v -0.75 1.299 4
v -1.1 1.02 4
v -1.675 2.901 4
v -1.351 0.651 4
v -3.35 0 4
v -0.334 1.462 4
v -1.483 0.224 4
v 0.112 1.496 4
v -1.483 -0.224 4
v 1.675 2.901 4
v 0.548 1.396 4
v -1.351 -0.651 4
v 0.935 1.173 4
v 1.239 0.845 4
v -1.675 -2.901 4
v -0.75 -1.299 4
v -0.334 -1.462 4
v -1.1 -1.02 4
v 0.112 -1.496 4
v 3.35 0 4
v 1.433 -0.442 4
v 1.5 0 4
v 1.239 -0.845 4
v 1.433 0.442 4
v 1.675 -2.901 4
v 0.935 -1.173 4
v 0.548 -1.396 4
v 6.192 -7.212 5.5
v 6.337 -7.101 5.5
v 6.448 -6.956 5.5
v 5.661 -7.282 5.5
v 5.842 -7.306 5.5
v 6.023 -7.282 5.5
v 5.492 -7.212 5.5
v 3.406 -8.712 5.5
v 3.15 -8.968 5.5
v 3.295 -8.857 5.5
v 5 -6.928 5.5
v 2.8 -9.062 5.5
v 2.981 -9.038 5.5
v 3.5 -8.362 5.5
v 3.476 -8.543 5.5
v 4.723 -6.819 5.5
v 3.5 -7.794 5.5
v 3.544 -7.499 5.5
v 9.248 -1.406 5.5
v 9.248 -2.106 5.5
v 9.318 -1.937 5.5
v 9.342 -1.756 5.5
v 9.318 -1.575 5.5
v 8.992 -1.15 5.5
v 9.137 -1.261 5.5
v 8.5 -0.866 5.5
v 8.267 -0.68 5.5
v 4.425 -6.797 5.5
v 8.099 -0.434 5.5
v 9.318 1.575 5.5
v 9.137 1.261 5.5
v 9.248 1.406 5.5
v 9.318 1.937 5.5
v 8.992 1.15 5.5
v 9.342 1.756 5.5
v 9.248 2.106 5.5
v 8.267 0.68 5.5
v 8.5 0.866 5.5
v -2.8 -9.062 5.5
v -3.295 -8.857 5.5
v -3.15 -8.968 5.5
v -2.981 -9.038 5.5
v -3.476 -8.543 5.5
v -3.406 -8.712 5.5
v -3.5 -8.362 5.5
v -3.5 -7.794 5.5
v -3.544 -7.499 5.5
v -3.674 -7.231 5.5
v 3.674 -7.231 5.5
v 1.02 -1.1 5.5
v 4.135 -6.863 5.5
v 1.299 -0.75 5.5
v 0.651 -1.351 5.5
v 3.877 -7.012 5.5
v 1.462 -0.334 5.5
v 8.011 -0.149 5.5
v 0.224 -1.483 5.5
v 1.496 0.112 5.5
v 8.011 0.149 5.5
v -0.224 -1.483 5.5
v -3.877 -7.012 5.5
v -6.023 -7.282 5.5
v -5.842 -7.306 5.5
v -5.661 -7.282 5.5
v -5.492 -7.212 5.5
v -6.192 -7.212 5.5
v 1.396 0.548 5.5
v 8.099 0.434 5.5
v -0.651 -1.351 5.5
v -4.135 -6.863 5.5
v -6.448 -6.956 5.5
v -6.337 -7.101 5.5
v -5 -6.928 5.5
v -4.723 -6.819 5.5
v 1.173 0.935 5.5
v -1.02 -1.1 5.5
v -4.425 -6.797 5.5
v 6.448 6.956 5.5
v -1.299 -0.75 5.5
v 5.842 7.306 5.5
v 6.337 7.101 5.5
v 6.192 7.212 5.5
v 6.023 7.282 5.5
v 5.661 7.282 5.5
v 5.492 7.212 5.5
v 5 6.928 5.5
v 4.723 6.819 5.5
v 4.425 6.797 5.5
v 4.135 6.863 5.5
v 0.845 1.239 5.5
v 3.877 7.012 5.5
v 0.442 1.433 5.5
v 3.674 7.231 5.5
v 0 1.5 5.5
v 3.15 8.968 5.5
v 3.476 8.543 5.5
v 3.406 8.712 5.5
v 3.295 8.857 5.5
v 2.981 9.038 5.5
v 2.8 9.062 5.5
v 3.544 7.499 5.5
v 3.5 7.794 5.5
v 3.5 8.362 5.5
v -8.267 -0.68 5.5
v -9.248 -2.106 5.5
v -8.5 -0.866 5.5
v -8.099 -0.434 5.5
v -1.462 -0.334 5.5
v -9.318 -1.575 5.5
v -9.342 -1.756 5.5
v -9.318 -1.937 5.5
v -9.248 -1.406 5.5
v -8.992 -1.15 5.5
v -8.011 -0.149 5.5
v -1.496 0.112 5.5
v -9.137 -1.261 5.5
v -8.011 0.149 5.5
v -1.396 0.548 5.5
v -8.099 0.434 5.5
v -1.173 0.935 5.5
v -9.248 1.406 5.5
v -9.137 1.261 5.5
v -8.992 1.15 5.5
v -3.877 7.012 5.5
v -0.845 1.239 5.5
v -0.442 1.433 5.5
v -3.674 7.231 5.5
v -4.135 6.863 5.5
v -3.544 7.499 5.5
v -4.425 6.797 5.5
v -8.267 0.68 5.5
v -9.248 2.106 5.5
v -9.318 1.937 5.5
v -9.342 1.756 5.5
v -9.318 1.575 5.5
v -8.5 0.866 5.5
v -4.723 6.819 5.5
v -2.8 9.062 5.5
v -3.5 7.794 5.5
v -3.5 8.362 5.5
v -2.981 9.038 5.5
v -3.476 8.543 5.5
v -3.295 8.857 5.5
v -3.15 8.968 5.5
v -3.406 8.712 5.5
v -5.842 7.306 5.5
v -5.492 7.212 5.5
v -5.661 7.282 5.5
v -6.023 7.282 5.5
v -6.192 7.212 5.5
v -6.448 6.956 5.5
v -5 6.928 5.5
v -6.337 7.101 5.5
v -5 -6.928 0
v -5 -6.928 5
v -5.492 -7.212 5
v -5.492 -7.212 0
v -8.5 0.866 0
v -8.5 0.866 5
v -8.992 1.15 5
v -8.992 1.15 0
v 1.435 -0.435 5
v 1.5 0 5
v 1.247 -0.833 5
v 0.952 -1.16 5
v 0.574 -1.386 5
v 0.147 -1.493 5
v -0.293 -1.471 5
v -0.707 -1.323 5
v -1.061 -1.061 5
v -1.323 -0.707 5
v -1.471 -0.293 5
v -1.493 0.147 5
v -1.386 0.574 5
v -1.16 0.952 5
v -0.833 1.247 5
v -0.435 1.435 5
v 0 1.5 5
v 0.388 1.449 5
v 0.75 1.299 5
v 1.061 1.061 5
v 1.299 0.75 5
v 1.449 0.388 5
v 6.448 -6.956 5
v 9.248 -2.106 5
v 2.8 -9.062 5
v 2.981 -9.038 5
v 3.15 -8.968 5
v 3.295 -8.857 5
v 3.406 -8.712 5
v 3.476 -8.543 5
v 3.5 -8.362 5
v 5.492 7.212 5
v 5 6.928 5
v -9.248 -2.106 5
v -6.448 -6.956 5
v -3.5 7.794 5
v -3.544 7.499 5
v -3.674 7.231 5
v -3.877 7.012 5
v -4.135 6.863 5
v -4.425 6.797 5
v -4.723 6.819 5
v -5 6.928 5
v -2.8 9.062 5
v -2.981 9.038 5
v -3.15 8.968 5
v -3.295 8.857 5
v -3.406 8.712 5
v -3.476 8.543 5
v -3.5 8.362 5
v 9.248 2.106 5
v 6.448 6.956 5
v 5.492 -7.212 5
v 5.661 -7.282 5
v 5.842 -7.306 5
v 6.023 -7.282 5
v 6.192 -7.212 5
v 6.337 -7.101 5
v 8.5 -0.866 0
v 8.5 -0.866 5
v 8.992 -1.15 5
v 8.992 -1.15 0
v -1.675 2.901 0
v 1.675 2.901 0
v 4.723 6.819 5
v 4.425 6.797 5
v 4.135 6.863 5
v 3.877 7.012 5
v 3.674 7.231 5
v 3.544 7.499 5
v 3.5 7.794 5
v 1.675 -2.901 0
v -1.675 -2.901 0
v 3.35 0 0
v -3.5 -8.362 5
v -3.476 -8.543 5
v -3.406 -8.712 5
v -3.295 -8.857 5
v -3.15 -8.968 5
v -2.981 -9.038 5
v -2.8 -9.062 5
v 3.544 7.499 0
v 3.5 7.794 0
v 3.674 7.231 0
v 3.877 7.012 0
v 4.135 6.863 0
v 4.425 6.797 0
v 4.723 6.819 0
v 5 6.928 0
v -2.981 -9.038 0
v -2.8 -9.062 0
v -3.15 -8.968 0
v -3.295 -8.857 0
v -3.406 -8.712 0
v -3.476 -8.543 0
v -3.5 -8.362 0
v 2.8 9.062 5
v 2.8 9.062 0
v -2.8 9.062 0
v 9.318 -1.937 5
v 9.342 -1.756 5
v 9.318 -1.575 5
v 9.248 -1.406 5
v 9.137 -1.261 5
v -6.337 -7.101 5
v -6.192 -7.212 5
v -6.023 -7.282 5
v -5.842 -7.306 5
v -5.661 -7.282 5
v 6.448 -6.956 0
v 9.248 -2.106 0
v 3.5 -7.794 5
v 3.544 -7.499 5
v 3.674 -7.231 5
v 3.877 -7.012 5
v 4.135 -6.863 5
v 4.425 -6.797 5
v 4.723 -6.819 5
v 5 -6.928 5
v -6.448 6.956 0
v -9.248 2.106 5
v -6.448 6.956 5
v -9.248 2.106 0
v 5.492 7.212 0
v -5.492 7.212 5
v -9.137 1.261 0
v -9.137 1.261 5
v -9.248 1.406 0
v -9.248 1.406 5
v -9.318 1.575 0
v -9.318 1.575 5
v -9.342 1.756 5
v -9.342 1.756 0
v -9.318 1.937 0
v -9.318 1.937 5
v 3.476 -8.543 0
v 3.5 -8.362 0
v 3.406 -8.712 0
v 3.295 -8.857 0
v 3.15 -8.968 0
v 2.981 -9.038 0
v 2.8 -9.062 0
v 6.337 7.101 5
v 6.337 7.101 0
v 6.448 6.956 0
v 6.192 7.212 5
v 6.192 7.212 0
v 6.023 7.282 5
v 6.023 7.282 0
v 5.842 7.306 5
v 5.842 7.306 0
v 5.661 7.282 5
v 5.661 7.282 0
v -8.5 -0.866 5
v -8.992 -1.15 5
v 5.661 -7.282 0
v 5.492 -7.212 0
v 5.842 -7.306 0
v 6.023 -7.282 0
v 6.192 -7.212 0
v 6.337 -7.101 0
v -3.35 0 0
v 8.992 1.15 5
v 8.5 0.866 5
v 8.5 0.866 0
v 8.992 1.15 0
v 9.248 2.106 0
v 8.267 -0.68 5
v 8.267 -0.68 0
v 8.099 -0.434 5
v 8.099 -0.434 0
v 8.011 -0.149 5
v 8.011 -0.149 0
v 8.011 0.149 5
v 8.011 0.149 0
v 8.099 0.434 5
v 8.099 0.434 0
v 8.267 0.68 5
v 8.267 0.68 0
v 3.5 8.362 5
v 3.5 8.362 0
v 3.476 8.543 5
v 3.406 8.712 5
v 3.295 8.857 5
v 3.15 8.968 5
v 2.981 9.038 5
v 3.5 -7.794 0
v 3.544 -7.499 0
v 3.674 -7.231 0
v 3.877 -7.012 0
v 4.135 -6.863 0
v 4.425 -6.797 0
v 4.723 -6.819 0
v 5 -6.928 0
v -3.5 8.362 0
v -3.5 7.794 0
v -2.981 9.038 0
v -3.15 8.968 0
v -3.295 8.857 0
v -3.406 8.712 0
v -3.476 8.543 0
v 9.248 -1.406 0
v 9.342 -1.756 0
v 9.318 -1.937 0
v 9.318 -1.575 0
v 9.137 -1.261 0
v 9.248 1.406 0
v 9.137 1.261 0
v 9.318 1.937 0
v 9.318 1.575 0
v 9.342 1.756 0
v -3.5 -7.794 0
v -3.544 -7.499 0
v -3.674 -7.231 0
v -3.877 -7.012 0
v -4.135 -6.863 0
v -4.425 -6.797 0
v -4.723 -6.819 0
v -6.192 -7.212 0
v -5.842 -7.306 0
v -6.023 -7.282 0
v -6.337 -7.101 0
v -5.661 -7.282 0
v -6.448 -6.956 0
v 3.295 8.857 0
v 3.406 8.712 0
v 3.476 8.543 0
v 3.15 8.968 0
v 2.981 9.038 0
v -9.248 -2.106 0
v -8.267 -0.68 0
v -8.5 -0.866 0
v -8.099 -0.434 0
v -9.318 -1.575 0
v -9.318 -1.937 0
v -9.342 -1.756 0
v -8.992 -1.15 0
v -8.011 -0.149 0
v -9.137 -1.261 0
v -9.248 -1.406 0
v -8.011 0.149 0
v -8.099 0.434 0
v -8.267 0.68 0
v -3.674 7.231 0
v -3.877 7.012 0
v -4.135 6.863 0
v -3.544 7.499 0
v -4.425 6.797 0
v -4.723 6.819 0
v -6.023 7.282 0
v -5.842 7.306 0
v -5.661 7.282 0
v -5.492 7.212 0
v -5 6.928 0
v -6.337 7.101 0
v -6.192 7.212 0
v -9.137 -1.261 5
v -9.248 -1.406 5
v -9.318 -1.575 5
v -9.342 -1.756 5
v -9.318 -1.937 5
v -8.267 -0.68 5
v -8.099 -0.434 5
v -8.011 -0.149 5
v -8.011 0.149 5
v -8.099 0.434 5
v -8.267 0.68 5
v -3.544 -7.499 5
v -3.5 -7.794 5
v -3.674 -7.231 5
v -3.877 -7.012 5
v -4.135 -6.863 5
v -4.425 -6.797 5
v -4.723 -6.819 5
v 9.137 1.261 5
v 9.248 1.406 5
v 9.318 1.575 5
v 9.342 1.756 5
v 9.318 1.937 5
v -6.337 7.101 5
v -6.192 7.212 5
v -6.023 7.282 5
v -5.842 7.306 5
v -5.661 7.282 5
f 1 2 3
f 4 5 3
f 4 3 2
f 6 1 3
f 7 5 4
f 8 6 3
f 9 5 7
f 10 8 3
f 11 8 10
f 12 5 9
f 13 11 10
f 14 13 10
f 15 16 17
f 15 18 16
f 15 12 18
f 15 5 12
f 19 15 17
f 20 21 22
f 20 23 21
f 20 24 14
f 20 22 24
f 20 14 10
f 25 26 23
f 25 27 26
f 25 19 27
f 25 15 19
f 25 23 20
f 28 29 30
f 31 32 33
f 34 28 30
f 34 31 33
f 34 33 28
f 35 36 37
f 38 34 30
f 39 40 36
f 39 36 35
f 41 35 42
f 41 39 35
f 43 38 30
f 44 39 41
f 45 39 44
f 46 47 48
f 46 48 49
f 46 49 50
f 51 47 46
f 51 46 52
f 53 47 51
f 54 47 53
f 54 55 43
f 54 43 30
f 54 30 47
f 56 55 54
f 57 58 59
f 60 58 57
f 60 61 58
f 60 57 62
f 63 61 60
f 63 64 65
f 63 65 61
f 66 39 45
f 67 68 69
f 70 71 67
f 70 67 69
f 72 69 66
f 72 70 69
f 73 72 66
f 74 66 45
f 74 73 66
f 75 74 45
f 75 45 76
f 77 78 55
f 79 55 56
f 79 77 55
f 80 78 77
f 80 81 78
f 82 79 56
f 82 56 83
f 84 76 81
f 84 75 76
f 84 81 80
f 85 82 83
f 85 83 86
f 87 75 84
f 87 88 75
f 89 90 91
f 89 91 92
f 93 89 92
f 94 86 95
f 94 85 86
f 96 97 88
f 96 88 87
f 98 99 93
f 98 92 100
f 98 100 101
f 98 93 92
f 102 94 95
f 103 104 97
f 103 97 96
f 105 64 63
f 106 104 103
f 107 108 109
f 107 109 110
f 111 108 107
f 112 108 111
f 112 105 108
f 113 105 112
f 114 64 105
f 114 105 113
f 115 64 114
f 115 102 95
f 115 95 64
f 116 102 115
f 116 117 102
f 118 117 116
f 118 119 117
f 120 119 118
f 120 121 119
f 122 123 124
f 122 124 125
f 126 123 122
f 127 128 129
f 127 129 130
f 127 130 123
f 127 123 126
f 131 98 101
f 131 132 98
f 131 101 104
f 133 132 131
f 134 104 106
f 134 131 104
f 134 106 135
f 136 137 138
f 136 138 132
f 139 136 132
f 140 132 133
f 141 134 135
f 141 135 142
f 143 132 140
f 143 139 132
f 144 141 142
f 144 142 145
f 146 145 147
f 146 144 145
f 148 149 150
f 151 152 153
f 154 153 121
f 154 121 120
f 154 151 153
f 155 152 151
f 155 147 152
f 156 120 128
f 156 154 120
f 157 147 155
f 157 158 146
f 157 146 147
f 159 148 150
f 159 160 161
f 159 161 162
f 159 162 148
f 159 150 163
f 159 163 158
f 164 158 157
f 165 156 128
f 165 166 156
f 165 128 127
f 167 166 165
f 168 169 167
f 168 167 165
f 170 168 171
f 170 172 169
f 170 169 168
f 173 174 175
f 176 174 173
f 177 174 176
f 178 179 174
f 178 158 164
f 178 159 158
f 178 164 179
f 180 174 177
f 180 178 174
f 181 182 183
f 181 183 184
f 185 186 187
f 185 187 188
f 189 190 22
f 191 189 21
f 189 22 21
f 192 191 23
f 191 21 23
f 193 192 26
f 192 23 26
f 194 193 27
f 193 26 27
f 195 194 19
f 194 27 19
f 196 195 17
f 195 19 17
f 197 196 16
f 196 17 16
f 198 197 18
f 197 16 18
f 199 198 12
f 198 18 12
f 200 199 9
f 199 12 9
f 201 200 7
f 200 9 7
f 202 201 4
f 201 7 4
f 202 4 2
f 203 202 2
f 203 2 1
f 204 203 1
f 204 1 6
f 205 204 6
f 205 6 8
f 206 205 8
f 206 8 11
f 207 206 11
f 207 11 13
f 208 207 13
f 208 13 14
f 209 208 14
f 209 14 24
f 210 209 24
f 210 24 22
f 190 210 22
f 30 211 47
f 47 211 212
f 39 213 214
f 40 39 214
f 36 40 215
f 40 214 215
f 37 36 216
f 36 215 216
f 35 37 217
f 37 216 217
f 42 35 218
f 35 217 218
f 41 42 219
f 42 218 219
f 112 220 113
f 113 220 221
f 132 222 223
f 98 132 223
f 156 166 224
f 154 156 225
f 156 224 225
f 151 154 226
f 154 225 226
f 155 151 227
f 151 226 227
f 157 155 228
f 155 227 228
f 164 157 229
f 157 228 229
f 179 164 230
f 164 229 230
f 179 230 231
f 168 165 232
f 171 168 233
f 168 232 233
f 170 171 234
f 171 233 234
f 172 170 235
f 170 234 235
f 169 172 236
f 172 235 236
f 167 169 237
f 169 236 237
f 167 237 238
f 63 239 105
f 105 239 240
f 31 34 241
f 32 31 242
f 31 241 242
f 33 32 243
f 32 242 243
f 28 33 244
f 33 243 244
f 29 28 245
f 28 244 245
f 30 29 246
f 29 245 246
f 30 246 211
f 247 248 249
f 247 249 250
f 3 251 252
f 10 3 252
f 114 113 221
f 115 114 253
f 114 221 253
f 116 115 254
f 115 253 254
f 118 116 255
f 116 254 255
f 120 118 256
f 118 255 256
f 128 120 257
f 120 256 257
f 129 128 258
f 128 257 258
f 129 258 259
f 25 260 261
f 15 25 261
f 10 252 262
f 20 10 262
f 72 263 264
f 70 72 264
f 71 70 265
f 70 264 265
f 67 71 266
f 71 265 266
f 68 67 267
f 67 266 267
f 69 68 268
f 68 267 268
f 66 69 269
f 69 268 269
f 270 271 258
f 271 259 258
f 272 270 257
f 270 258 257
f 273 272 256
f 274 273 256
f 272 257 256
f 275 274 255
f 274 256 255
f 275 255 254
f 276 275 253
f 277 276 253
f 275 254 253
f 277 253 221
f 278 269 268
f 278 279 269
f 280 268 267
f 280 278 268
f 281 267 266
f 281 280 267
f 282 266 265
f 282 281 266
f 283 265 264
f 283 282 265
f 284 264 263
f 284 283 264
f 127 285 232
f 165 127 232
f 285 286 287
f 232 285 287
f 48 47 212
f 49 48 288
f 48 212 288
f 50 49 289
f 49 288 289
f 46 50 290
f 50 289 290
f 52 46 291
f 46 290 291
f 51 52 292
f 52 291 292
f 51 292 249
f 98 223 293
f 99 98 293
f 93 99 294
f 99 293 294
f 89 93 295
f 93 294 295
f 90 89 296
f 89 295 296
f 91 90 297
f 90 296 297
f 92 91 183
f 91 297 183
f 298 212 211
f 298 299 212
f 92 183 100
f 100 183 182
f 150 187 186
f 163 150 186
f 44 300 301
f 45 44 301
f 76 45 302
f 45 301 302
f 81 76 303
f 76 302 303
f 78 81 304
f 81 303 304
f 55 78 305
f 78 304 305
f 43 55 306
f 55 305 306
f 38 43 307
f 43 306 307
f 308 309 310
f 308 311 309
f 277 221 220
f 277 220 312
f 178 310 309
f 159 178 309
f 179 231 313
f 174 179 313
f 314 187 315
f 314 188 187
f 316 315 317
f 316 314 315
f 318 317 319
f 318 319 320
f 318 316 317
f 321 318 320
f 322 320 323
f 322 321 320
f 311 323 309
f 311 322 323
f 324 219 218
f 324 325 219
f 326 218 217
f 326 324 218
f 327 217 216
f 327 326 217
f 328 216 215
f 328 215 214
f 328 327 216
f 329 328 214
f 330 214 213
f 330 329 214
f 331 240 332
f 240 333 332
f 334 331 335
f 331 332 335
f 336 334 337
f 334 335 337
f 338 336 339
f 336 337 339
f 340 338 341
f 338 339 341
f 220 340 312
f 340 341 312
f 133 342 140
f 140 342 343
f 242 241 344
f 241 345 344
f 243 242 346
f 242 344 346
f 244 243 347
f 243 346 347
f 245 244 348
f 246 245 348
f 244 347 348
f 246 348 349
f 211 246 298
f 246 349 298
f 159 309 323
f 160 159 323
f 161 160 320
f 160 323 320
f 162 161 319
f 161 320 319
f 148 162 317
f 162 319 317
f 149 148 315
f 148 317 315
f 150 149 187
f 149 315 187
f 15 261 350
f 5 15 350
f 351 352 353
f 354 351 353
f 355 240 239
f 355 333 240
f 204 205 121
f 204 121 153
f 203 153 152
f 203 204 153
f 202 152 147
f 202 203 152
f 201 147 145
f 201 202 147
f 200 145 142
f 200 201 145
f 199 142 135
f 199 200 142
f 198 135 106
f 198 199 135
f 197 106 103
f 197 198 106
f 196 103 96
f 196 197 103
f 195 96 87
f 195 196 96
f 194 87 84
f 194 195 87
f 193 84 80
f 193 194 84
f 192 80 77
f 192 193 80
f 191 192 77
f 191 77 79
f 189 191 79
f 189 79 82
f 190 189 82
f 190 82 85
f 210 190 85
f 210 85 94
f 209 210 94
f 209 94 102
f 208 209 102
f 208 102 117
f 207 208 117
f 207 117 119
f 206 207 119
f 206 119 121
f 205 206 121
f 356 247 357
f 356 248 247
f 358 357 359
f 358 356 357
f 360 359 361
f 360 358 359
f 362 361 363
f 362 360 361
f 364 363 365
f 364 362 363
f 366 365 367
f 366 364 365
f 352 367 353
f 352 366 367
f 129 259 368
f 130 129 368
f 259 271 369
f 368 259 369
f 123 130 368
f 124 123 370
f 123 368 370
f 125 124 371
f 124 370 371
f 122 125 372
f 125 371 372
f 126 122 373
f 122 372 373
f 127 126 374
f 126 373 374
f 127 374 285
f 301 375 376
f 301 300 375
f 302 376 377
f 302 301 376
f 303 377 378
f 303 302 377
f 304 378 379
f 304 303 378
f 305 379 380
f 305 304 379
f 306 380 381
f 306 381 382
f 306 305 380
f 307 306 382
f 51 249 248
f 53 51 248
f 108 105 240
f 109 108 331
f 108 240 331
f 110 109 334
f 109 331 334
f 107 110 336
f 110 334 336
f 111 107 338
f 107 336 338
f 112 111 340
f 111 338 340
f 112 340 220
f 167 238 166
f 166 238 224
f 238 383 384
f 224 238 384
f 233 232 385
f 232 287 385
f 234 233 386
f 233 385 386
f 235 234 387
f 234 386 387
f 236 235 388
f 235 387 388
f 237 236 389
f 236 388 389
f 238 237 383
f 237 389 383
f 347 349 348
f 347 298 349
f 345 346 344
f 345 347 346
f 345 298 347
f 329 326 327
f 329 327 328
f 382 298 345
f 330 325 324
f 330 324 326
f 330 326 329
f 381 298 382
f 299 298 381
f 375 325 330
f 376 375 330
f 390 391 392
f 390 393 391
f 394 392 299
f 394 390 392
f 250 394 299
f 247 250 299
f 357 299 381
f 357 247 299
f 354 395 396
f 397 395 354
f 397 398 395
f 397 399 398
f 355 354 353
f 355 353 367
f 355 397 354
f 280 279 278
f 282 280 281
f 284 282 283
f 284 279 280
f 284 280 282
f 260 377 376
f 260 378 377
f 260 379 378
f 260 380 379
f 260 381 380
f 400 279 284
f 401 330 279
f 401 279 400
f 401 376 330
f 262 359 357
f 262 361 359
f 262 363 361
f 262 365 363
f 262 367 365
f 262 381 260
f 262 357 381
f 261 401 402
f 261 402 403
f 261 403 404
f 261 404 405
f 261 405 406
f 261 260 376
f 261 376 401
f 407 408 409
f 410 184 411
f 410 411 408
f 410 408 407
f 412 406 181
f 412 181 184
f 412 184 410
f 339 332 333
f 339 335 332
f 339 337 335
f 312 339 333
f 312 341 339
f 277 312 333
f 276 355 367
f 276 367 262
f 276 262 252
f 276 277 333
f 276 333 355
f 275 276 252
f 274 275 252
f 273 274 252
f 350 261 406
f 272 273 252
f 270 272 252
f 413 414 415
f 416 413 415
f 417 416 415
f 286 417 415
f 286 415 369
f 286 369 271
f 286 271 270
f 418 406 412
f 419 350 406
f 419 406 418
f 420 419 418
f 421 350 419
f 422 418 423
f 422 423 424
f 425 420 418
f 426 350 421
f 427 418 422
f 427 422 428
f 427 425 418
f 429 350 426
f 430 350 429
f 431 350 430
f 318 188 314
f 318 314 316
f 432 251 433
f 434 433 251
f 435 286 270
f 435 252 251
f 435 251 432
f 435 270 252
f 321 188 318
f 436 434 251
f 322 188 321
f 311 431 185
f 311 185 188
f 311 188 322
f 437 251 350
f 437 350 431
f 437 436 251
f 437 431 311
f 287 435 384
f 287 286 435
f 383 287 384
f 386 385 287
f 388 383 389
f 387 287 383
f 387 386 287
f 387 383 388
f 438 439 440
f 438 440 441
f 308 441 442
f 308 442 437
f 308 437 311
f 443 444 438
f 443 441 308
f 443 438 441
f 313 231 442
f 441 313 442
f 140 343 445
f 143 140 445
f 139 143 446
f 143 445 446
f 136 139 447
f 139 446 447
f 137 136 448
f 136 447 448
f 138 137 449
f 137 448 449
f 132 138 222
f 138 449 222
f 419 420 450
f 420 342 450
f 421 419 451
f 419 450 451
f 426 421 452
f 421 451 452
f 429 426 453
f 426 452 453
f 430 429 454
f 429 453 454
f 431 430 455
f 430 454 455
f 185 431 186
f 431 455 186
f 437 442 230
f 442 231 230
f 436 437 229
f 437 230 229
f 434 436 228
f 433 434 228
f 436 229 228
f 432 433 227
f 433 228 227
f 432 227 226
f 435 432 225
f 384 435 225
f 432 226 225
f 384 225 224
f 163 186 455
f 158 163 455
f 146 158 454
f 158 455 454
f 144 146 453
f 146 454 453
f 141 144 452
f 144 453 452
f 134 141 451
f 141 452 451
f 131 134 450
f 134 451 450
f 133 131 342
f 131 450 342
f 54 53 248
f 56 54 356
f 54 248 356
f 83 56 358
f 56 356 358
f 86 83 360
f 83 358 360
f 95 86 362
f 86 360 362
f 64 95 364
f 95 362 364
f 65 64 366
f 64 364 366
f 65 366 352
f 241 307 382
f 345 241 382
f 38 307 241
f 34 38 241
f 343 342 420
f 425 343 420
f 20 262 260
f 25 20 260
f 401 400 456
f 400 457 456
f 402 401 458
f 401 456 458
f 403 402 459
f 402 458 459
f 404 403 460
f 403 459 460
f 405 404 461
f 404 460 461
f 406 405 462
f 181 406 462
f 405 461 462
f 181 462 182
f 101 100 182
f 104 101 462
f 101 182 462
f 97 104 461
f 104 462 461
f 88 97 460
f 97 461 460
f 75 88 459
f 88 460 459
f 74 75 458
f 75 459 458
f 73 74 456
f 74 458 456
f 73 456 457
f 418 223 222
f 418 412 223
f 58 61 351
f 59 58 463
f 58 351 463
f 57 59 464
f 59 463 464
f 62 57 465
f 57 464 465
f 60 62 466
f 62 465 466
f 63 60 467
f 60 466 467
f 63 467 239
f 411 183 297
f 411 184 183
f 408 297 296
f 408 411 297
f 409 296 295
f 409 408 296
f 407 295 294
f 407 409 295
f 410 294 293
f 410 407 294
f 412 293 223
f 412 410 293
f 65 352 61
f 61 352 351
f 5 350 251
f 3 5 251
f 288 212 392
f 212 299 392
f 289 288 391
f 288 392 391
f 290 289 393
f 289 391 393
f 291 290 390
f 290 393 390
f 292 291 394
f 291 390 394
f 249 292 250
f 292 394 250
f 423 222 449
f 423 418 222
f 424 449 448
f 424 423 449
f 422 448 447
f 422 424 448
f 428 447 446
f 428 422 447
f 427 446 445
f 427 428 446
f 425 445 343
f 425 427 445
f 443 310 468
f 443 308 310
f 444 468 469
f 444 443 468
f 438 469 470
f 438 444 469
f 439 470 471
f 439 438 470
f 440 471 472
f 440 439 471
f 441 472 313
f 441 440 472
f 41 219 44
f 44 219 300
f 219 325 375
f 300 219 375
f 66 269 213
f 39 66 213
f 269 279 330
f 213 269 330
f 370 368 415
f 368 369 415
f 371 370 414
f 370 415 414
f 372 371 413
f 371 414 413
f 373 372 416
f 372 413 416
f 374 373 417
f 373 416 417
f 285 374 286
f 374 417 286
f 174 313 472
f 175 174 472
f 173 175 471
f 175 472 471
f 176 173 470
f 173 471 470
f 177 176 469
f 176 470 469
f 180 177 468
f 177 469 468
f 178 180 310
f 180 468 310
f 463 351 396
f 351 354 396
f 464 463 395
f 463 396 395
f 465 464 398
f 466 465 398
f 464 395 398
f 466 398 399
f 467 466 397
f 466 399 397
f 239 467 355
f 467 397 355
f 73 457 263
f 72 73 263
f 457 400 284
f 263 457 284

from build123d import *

# Parameters (mm, degrees)
PAD_DEPTH         = 5
POCKET_DEPTH      = 4
POCKET_FACE1_W    = 7
POCKET_FACE1_H    = 5
PAD001_DEPTH      = 3
PAD001_FACE6_W    = 7
PAD001_FACE6_H    = 5
PAD002_DEPTH      = 3
PAD002_FACE6_W    = 7
PAD002_FACE6_H    = 5
PAD003_DEPTH      = 3
PAD003_FACE1_W    = 7
PAD003_FACE1_H    = 5
PAD004_DEPTH      = 3
PAD004_FACE1_W    = 7
PAD004_FACE1_H    = 5
PAD005_DEPTH      = 3
PAD005_FACE1_W    = 7
PAD005_FACE1_H    = 5
PAD006_DEPTH      = 3
FILLET_R          = 1
FILLET001_R       = 0.7
SKETCH002_R       = 1.5
POCKET001_DEPTH   = 5
POCKET001_FACE5_R = 1.5
PAD007_DEPTH      = 0.5


with BuildPart() as part:
    # Sketch → Pad (new body)
    with BuildSketch(Plane.XY):
        Polygon((7, 0), (3.5, 6.0621778265), (-3.5, 6.0621778265), (-7, 0), (-3.5, -6.0621778265), (3.5, -6.0621778265), align=None)
    extrude(amount=PAD_DEPTH)

    # Sketch001 (on Face7 of Pad) → Pocket (cut)
    with BuildSketch(Plane(origin=(0, 0, 0), x_dir=(1, 0, 0), z_dir=(0, 0, -1))):
        Polygon((3.35, 0), (1.675, 2.9011851027), (-1.675, 2.9011851027), (-3.35, 0), (-1.675, -2.9011851027), (1.675, -2.9011851027), align=None)
    extrude(amount=-POCKET_DEPTH, mode=Mode.SUBTRACT)

    # Pocket Face1 → Pad001 (add)
    with BuildSketch(Plane(origin=(5.25, 3.0310889132, 2.5), x_dir=(0.5, -0.8660254038, 0), z_dir=(0.8660254038, 0.5, 0))):
        Rectangle(POCKET_FACE1_W, POCKET_FACE1_H)
    extrude(amount=PAD001_DEPTH)

    # Pad001 Face6 → Pad002 (add)
    with BuildSketch(Plane(origin=(-5.25, -3.0310889132, 2.5), x_dir=(-0.5, 0.8660254038, 0), z_dir=(-0.8660254038, -0.5, 0))):
        Rectangle(PAD001_FACE6_W, PAD001_FACE6_H)
    extrude(amount=PAD002_DEPTH)

    # Pad002 Face6 → Pad003 (add)
    with BuildSketch(Plane(origin=(-5.25, 3.0310889132, 2.5), x_dir=(0.5, 0.8660254038, 0), z_dir=(-0.8660254038, 0.5, 0))):
        Rectangle(PAD002_FACE6_W, PAD002_FACE6_H)
    extrude(amount=PAD003_DEPTH)

    # Pad003 Face1 → Pad004 (add)
    with BuildSketch(Plane(origin=(0, 6.0621778265, 2.5), x_dir=(1, 0, 0), z_dir=(0, 1, 0))):
        Rectangle(PAD003_FACE1_W, PAD003_FACE1_H)
    extrude(amount=PAD004_DEPTH)

    # Pad004 Face1 → Pad005 (add)
    with BuildSketch(Plane(origin=(5.25, -3.0310889132, 2.5), x_dir=(-0.5, -0.8660254038, 0), z_dir=(0.8660254038, -0.5, 0))):
        Rectangle(PAD004_FACE1_W, PAD004_FACE1_H)
    extrude(amount=PAD005_DEPTH)

    # Pad005 Face1 → Pad006 (add)
    with BuildSketch(Plane(origin=(0, -6.0621778265, 2.5), x_dir=(-1, 0, 0), z_dir=(0, -1, 0))):
        Rectangle(PAD005_FACE1_W, PAD005_FACE1_H)
    extrude(amount=PAD006_DEPTH)

    # Fillet
    fillet_edges = [part.edges().sort_by_distance(p)[0] for p in [
        (3.5, -6.062178, 2.5),
        (-3.5, -6.062178, 2.5),
        (-7, 0, 2.5),
        (-3.5, 6.062178, 2.5),
        (3.5, 6.062178, 2.5),
        (7, 0, 2.5),
    ]]
    fillet(fillet_edges, radius=FILLET_R)

    # Fillet001
    fillet001_edges = [part.edges().sort_by_distance(p)[0] for p in [
        (-6.098076, -7.562178, 2.5),
        (-9.598076, -1.5, 2.5),
        (-9.598076, 1.5, 2.5),
        (-6.098076, 7.562178, 2.5),
        (-3.5, 9.062178, 2.5),
        (3.5, 9.062178, 2.5),
        (6.098076, 7.562178, 2.5),
        (9.598076, 1.5, 2.5),
        (9.598076, -1.5, 2.5),
        (6.098076, -7.562178, 2.5),
        (3.5, -9.062178, 2.5),
        (-3.5, -9.062178, 2.5),
    ]]
    fillet(fillet001_edges, radius=FILLET001_R)

    # Sketch002 (on Face45 of Fillet001) → Pocket001 (cut)
    with BuildSketch(Plane(origin=(0, 0, 4), x_dir=(1, 0, 0), z_dir=(0, 0, -1))):
        Circle(SKETCH002_R)
    extrude(amount=-POCKET001_DEPTH, mode=Mode.SUBTRACT)

    # Pocket001 Face5 → Pad007 (add)
    with BuildSketch(Plane(origin=(0, 0, 5), x_dir=(0, 1, 0), z_dir=(0, 0, 1))):
        with BuildLine():
            Line((6.9282032303, 5), (7.2121778265, 5.4918584287))
            ThreePointArc((7.2121778265, 5.4918584287), (7.2821081222, 6.0230317603), (6.9559600438, 6.4480762114))
            Line((6.9559600438, 6.4480762114), (2.1062177826, 9.2480762114))
            ThreePointArc((2.1062177826, 9.2480762114), (1.5750444511, 9.3180065071), (1.15, 8.9918584287))
            Line((1.15, 8.9918584287), (0.8660254038, 8.5))
            ThreePointArc((0.8660254038, 8.5), (0, 8), (-0.8660254038, 8.5))
            Line((-0.8660254038, 8.5), (-1.15, 8.9918584287))
            ThreePointArc((-1.15, 8.9918584287), (-1.5750444511, 9.3180065071), (-2.1062177826, 9.2480762114))
            Line((-2.1062177826, 9.2480762114), (-6.9559600438, 6.4480762114))
            ThreePointArc((-6.9559600438, 6.4480762114), (-7.2821081222, 6.0230317603), (-7.2121778265, 5.4918584287))
            Line((-7.2121778265, 5.4918584287), (-6.9282032303, 5))
            ThreePointArc((-6.9282032303, 5), (-6.9282032303, 4), (-7.7942286341, 3.5))
            Line((-7.7942286341, 3.5), (-8.3621778265, 3.5))
            ThreePointArc((-8.3621778265, 3.5), (-8.8571525733, 3.2949747468), (-9.0621778265, 2.8))
            Line((-9.0621778265, 2.8), (-9.0621778265, -2.8))
            ThreePointArc((-9.0621778265, -2.8), (-8.8571525733, -3.2949747468), (-8.3621778265, -3.5))
            Line((-8.3621778265, -3.5), (-7.7942286341, -3.5))
            ThreePointArc((-7.7942286341, -3.5), (-6.9282032303, -4), (-6.9282032303, -5))
            Line((-6.9282032303, -5), (-7.2121778265, -5.4918584287))
            ThreePointArc((-7.2121778265, -5.4918584287), (-7.2821081222, -6.0230317603), (-6.9559600438, -6.4480762114))
            Line((-6.9559600438, -6.4480762114), (-2.1062177826, -9.2480762114))
            ThreePointArc((-2.1062177826, -9.2480762114), (-1.5750444511, -9.3180065071), (-1.15, -8.9918584287))
            Line((-1.15, -8.9918584287), (-0.8660254038, -8.5))
            ThreePointArc((-0.8660254038, -8.5), (0, -8), (0.8660254038, -8.5))
            Line((0.8660254038, -8.5), (1.15, -8.9918584287))
            ThreePointArc((1.15, -8.9918584287), (1.5750444511, -9.3180065071), (2.1062177826, -9.2480762114))
            Line((2.1062177826, -9.2480762114), (6.9559600438, -6.4480762114))
            ThreePointArc((6.9559600438, -6.4480762114), (7.2821081222, -6.0230317603), (7.2121778265, -5.4918584287))
            Line((7.2121778265, -5.4918584287), (6.9282032303, -5))
            ThreePointArc((6.9282032303, -5), (6.9282032303, -4), (7.7942286341, -3.5))
            Line((7.7942286341, -3.5), (8.3621778265, -3.5))
            ThreePointArc((8.3621778265, -3.5), (8.8571525733, -3.2949747468), (9.0621778265, -2.8))
            Line((9.0621778265, -2.8), (9.0621778265, 2.8))
            ThreePointArc((9.0621778265, 2.8), (8.8571525733, 3.2949747468), (8.3621778265, 3.5))
            Line((8.3621778265, 3.5), (7.7942286341, 3.5))
            ThreePointArc((7.7942286341, 3.5), (6.9282032303, 4), (6.9282032303, 5))
        make_face()
        Circle(POCKET001_FACE5_R, mode=Mode.SUBTRACT)
    extrude(amount=PAD007_DEPTH)


solid = part.part
